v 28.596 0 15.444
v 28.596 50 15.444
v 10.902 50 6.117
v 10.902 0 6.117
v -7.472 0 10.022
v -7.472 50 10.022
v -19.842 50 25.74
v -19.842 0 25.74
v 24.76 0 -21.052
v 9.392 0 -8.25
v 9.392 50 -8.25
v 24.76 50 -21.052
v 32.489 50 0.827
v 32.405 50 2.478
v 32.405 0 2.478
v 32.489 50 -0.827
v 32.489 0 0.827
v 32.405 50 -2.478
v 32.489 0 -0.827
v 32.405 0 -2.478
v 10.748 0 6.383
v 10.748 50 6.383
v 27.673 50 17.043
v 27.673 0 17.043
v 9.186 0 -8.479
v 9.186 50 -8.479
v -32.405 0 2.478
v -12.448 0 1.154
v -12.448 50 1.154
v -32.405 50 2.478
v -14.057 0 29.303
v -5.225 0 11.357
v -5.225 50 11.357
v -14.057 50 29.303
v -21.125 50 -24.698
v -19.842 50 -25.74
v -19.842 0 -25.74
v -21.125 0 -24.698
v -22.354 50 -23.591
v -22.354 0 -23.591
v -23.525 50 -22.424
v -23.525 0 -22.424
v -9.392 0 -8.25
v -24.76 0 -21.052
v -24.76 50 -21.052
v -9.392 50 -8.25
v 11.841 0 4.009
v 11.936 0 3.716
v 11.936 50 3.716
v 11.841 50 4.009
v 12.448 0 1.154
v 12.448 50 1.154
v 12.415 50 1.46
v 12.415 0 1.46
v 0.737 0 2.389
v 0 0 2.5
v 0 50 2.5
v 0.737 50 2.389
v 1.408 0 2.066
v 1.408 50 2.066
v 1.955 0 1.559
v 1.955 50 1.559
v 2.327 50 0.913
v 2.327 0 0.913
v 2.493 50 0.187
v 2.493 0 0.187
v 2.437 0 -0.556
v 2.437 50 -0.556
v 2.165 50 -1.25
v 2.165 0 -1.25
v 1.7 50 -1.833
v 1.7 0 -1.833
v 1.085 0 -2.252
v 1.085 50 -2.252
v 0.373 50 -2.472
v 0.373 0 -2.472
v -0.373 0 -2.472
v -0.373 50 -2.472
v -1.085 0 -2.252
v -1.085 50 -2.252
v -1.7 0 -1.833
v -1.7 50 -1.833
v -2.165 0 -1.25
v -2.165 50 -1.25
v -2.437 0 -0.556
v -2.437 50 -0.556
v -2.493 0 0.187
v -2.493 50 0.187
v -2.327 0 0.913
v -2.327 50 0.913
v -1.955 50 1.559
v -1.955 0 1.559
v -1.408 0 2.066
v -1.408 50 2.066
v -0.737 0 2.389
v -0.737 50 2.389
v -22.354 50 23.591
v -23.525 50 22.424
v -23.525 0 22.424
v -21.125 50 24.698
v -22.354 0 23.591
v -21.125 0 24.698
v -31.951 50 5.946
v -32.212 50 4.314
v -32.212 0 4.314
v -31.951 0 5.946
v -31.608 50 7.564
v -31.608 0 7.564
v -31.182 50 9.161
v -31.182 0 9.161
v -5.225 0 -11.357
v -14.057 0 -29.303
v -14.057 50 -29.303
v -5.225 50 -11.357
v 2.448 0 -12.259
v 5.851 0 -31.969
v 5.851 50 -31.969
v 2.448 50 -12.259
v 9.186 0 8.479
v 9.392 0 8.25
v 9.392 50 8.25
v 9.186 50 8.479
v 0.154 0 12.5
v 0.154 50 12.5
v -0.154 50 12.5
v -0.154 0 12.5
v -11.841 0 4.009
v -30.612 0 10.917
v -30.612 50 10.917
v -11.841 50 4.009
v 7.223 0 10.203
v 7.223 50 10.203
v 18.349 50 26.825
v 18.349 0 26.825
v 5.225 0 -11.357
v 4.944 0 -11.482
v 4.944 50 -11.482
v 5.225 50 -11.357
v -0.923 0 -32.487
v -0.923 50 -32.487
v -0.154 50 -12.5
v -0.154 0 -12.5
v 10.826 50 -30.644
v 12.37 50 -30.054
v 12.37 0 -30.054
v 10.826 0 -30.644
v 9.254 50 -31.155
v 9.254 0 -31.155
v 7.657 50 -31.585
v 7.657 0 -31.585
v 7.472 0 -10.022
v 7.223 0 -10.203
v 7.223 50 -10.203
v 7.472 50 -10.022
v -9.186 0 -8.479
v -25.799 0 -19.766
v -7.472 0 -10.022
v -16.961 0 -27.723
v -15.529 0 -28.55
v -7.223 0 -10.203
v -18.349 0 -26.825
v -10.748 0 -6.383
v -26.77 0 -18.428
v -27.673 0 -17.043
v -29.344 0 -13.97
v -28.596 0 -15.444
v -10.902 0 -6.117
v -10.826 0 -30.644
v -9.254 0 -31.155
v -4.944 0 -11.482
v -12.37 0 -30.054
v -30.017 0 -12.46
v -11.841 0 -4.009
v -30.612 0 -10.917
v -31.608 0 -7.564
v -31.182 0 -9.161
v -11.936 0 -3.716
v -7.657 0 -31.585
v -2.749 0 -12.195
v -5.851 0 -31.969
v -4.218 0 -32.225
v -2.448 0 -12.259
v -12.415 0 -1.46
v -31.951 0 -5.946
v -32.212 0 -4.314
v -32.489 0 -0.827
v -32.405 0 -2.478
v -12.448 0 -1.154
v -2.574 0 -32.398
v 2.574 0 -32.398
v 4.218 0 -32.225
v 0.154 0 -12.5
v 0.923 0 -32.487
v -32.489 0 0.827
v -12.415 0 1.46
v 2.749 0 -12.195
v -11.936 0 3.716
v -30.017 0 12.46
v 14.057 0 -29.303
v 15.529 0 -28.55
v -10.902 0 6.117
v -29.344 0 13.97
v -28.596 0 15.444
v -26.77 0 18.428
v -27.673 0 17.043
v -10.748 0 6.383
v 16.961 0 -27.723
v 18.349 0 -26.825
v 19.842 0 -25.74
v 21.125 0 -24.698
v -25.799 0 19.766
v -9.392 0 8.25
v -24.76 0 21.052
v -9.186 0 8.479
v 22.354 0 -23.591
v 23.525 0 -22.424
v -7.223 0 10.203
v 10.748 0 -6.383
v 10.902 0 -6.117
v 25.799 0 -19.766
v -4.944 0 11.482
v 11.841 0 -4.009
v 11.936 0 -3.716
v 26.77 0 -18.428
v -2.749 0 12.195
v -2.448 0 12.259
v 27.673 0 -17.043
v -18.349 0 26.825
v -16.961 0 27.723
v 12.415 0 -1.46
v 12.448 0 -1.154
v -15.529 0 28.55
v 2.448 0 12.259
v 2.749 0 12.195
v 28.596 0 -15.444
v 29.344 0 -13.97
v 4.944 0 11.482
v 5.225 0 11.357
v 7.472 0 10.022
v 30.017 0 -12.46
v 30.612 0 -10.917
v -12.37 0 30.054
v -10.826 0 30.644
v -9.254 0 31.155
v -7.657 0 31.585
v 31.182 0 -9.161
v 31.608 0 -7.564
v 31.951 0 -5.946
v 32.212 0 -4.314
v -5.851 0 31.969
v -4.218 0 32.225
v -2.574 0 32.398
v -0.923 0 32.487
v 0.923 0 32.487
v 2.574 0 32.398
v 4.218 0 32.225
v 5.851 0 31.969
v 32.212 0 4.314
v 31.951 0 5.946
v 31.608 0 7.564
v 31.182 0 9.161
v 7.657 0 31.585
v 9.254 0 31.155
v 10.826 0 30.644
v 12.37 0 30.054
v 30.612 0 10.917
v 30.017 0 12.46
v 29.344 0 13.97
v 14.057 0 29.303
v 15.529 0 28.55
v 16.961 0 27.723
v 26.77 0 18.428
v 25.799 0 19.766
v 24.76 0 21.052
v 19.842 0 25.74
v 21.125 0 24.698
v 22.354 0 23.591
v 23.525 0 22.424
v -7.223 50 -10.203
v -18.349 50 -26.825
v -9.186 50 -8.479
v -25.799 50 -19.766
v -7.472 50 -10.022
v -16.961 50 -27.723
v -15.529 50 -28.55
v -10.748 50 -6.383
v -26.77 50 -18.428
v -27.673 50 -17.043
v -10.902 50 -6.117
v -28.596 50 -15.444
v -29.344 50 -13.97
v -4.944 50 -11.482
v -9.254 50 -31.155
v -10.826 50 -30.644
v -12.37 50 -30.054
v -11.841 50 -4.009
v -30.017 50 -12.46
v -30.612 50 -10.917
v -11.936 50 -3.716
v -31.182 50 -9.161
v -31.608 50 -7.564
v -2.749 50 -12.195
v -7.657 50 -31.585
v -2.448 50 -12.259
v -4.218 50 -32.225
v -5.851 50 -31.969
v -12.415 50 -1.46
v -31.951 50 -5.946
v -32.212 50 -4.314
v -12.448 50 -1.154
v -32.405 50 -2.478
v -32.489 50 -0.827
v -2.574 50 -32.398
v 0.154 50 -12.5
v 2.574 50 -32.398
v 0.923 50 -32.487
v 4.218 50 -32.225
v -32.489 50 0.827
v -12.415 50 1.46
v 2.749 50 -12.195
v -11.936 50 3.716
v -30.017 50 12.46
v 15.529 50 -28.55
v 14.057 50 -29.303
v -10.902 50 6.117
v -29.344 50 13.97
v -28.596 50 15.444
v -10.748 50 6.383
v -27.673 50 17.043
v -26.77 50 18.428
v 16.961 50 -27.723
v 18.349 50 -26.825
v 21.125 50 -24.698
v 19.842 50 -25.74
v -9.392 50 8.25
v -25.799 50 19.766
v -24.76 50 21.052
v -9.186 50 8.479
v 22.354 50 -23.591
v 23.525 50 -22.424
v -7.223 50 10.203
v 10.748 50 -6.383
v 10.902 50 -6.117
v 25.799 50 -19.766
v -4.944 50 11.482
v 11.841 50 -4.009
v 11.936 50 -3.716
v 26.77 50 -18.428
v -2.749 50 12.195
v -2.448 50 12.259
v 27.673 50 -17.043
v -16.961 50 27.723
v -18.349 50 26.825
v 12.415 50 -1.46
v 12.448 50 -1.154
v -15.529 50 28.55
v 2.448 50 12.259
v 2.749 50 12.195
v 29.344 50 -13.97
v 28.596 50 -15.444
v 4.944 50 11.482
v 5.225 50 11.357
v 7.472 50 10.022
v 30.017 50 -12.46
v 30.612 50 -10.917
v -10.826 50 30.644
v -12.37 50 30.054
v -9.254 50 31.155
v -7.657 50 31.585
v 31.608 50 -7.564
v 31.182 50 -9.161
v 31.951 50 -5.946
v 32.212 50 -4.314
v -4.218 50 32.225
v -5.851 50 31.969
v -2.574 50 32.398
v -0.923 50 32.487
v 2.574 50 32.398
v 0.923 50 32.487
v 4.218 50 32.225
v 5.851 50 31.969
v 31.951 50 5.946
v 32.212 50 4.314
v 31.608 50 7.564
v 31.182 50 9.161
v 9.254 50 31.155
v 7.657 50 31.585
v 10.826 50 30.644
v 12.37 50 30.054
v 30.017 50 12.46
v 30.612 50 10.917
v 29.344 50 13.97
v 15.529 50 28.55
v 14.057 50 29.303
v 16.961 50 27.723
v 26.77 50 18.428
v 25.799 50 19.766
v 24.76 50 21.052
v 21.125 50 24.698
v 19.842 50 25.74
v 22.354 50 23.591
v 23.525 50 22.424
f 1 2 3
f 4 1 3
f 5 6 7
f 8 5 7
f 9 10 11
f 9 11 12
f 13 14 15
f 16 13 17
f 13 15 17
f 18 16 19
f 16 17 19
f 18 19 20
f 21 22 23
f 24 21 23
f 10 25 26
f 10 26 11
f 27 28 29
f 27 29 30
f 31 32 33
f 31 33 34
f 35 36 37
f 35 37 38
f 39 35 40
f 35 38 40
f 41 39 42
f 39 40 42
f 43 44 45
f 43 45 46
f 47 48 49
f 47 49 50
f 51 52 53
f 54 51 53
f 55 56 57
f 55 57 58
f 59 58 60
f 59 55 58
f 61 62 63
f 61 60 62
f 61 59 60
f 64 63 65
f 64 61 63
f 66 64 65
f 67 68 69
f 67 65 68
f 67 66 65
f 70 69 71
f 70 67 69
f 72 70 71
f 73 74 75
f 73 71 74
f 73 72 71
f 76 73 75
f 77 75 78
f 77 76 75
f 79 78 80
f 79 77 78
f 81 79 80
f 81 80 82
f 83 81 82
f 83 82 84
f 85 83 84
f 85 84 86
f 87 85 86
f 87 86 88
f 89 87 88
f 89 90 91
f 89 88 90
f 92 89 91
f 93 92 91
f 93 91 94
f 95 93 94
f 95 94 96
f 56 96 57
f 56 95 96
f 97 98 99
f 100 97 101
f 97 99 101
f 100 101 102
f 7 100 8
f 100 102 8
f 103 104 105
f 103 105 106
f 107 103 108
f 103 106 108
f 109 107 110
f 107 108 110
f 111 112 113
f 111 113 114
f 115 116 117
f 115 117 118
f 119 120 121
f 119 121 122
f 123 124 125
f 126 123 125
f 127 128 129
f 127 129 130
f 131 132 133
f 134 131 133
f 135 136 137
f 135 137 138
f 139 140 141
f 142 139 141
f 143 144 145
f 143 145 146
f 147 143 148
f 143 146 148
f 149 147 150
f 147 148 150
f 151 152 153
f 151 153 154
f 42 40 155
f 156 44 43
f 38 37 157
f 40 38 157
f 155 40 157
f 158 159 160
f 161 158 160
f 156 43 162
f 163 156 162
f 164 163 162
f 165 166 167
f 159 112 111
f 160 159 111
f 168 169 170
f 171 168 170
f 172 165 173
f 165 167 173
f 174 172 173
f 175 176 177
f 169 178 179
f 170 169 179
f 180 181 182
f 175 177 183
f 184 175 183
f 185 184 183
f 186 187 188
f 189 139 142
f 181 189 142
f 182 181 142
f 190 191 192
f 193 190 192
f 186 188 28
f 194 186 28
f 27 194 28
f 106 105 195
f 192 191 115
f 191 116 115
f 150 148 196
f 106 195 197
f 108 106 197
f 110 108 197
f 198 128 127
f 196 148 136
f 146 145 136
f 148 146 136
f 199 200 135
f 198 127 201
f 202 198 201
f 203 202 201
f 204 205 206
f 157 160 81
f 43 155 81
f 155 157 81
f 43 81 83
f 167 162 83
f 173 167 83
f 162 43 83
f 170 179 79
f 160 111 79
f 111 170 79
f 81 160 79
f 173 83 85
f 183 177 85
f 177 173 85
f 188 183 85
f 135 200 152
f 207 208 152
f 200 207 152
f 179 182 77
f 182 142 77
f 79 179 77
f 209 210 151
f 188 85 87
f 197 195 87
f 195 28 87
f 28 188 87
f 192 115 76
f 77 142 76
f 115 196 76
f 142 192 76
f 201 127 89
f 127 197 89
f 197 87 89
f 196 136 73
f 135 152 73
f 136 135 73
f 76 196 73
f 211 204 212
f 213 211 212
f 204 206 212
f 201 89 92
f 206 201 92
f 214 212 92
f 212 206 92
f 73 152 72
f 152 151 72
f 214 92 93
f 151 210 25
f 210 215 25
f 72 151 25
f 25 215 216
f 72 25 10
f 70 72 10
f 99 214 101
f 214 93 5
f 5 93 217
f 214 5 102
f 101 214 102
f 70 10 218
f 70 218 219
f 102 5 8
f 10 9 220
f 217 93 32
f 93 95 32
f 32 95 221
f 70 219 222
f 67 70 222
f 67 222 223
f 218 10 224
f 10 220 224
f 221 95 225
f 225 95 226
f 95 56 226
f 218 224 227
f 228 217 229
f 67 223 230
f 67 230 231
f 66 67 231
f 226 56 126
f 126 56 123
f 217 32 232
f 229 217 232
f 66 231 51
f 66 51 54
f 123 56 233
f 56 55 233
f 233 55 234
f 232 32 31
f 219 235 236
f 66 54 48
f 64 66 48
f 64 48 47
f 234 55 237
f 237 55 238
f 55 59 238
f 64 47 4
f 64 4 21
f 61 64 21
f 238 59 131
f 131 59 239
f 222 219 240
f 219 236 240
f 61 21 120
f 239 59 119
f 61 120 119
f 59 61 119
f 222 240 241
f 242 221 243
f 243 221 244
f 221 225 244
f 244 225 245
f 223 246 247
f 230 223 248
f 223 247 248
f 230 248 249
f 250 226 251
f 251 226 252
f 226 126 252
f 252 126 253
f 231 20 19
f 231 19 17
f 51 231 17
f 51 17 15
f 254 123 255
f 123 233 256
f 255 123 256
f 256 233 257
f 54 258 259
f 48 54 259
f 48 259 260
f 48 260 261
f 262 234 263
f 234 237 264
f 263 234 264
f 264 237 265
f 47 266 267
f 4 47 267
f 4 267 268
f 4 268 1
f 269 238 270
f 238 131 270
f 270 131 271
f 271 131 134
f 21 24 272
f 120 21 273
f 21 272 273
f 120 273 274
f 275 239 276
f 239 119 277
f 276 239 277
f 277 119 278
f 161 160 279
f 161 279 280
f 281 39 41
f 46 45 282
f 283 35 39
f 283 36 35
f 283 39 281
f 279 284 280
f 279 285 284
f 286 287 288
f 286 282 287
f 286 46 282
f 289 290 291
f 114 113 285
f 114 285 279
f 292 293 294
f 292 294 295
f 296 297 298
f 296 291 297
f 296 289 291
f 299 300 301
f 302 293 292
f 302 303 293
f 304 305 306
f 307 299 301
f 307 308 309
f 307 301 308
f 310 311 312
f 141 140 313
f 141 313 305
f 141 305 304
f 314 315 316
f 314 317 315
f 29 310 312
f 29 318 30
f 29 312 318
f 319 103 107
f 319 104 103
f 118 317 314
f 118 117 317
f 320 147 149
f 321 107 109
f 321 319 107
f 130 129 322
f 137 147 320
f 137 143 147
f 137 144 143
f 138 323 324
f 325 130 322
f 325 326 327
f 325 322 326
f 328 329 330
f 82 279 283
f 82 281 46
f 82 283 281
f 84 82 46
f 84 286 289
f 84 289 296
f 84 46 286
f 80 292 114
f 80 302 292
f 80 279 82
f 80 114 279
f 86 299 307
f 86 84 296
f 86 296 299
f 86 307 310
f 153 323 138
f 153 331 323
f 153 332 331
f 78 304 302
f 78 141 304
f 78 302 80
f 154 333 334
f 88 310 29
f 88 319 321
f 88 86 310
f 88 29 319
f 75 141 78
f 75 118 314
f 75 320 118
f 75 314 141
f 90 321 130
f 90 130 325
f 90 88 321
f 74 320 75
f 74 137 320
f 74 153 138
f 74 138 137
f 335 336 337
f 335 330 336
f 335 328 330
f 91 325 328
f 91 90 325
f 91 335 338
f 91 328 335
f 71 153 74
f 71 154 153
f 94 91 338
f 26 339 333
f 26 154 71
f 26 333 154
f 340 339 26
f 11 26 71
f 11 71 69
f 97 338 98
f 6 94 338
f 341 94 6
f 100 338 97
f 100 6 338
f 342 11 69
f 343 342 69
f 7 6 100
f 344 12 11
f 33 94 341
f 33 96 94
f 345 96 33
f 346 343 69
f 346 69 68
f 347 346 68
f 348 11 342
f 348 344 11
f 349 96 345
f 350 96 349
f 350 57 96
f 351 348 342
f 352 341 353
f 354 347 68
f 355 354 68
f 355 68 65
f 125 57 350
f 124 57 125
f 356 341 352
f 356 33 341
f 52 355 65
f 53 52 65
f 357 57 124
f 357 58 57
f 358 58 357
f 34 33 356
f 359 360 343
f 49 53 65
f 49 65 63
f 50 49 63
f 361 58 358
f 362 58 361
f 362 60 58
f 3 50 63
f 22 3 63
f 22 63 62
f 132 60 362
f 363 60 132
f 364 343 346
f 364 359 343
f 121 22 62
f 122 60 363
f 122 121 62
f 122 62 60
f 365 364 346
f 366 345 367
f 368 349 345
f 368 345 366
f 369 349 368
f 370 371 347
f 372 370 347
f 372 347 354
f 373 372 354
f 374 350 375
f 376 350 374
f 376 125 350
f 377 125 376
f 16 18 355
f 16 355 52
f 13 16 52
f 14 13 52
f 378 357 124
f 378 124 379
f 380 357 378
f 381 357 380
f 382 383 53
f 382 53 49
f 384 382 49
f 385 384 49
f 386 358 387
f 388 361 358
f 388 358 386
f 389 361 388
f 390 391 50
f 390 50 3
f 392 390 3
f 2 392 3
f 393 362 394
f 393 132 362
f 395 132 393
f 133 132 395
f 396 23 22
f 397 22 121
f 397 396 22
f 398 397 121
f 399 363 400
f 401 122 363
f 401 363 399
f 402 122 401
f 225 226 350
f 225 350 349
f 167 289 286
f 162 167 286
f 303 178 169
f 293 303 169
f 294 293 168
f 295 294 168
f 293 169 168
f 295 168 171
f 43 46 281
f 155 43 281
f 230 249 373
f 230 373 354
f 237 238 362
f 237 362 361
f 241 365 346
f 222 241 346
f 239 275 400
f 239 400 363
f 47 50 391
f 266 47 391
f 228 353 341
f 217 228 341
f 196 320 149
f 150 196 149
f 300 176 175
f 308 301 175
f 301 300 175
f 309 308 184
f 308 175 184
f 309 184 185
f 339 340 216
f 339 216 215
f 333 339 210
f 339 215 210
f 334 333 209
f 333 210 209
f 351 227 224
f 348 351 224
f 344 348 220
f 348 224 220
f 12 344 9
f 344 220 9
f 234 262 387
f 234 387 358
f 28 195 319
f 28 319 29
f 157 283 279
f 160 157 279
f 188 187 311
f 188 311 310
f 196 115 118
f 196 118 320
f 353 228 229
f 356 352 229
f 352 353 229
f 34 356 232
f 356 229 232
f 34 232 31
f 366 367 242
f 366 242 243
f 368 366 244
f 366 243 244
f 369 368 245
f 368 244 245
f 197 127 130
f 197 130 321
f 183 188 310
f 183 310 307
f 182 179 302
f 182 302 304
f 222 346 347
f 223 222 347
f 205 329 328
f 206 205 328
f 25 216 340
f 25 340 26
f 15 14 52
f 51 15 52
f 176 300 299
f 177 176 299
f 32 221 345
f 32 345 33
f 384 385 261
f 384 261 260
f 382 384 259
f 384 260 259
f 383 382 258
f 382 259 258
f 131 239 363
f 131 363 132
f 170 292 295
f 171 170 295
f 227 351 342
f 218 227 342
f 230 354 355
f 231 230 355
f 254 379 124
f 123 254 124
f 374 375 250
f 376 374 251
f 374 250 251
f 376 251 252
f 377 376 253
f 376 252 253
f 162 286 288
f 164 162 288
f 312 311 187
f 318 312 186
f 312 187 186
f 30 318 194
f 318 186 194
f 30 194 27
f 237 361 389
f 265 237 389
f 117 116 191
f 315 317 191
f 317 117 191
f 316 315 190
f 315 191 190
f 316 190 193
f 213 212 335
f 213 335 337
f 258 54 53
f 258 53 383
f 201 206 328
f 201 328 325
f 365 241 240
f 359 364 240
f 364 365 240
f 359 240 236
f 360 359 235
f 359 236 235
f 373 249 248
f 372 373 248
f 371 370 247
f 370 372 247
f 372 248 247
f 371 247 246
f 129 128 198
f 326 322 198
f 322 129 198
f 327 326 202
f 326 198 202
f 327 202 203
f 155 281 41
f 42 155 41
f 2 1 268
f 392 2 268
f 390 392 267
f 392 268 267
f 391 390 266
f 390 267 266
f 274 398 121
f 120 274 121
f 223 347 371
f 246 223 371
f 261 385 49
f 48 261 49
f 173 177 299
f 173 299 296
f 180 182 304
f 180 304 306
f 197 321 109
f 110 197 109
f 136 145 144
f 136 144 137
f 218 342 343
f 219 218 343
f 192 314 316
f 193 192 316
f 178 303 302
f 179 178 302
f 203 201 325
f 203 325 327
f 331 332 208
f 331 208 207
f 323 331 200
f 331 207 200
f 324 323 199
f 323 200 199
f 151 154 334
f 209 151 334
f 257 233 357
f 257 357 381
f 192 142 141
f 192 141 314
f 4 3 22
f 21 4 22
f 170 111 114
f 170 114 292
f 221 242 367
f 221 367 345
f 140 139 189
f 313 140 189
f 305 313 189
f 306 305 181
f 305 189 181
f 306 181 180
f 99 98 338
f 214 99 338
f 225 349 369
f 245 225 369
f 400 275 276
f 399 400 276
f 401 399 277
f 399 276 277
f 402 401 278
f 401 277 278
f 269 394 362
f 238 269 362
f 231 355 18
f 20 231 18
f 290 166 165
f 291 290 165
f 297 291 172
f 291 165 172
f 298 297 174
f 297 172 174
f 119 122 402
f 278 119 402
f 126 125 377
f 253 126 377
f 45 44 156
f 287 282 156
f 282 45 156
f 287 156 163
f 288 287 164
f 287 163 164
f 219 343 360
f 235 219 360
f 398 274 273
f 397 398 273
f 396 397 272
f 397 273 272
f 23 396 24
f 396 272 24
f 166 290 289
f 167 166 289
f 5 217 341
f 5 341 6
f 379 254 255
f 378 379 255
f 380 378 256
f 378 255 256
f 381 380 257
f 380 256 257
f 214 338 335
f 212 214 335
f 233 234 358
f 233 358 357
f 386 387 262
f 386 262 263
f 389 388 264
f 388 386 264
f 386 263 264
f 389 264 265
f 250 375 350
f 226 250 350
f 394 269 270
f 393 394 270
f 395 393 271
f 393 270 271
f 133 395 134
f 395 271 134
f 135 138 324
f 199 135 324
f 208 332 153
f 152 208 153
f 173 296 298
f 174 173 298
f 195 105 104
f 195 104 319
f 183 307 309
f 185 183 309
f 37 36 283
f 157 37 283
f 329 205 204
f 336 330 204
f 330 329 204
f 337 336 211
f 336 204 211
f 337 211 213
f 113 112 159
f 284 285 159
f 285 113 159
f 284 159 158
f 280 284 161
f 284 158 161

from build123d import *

# Parameters (mm, degrees)
SKETCH1_R               = 32.5
BOSS_EXTRUDE1_DEPTH     = 50
CUT_EXTRUDE1_DEPTH      = 68.915388536
CIRPATTERN1_COUNT       = 30
CUT_EXTRUDE2_DEPTH      = 68.909114756
CUT_EXTRUDE2_DEPTH_BACK = 68.909114756
SKETCH3_R               = 2.5


with BuildPart() as part:
    # Sketch1 → Boss-Extrude1 (new body)
    with BuildSketch(Plane(origin=(0, 0, 0), x_dir=(1, 0, 0), z_dir=(0, 1, 0))):
        with Locations(Location((0, 0, 0), (0, 0, 270))):
            Circle(SKETCH1_R)
    extrude(amount=BOSS_EXTRUDE1_DEPTH)

    # Sketch2 → Cut-Extrude1 (cut, symmetric)
    with BuildSketch(Plane(origin=(0, 50, 0), x_dir=(1, 0, 0), z_dir=(0, 1, 0))):
        Polygon((-6.928301674, 188.527455376), (-0.923110544, 32.486887615), (-0.153919032, 12.5), (0.153919032, 12.5), (0.923110544, 32.486887615), (6.928301674, 188.527455376), (6.928301674, 500.839614011), (-6.928301674, 500.839614011), align=None)
    cut_extrude1 = extrude(amount=CUT_EXTRUDE1_DEPTH, both=True, mode=Mode.SUBTRACT)

    # CirPattern1: Cut-Extrude1 ×30 about axis
    cirpattern1_axis = Axis((0, 50, 0), (0, 1, 0))
    for i in range(1, CIRPATTERN1_COUNT):
        add(cut_extrude1.rotate(cirpattern1_axis, i * 360 / CIRPATTERN1_COUNT), mode=Mode.SUBTRACT)

    # Sketch3 → Cut-Extrude2 (cut, two sides: drawn at the far end of the back side and taken through both)
    with BuildSketch(Plane(origin=(0, 50, 0), x_dir=(1, 0, 0), z_dir=(0, 1, 0)).offset(-CUT_EXTRUDE2_DEPTH_BACK)):
        with Locations(Location((0, 0, 0), (0, 0, 270))):
            Circle(SKETCH3_R)
    extrude(amount=CUT_EXTRUDE2_DEPTH + CUT_EXTRUDE2_DEPTH_BACK, mode=Mode.SUBTRACT)


solid = part.part
